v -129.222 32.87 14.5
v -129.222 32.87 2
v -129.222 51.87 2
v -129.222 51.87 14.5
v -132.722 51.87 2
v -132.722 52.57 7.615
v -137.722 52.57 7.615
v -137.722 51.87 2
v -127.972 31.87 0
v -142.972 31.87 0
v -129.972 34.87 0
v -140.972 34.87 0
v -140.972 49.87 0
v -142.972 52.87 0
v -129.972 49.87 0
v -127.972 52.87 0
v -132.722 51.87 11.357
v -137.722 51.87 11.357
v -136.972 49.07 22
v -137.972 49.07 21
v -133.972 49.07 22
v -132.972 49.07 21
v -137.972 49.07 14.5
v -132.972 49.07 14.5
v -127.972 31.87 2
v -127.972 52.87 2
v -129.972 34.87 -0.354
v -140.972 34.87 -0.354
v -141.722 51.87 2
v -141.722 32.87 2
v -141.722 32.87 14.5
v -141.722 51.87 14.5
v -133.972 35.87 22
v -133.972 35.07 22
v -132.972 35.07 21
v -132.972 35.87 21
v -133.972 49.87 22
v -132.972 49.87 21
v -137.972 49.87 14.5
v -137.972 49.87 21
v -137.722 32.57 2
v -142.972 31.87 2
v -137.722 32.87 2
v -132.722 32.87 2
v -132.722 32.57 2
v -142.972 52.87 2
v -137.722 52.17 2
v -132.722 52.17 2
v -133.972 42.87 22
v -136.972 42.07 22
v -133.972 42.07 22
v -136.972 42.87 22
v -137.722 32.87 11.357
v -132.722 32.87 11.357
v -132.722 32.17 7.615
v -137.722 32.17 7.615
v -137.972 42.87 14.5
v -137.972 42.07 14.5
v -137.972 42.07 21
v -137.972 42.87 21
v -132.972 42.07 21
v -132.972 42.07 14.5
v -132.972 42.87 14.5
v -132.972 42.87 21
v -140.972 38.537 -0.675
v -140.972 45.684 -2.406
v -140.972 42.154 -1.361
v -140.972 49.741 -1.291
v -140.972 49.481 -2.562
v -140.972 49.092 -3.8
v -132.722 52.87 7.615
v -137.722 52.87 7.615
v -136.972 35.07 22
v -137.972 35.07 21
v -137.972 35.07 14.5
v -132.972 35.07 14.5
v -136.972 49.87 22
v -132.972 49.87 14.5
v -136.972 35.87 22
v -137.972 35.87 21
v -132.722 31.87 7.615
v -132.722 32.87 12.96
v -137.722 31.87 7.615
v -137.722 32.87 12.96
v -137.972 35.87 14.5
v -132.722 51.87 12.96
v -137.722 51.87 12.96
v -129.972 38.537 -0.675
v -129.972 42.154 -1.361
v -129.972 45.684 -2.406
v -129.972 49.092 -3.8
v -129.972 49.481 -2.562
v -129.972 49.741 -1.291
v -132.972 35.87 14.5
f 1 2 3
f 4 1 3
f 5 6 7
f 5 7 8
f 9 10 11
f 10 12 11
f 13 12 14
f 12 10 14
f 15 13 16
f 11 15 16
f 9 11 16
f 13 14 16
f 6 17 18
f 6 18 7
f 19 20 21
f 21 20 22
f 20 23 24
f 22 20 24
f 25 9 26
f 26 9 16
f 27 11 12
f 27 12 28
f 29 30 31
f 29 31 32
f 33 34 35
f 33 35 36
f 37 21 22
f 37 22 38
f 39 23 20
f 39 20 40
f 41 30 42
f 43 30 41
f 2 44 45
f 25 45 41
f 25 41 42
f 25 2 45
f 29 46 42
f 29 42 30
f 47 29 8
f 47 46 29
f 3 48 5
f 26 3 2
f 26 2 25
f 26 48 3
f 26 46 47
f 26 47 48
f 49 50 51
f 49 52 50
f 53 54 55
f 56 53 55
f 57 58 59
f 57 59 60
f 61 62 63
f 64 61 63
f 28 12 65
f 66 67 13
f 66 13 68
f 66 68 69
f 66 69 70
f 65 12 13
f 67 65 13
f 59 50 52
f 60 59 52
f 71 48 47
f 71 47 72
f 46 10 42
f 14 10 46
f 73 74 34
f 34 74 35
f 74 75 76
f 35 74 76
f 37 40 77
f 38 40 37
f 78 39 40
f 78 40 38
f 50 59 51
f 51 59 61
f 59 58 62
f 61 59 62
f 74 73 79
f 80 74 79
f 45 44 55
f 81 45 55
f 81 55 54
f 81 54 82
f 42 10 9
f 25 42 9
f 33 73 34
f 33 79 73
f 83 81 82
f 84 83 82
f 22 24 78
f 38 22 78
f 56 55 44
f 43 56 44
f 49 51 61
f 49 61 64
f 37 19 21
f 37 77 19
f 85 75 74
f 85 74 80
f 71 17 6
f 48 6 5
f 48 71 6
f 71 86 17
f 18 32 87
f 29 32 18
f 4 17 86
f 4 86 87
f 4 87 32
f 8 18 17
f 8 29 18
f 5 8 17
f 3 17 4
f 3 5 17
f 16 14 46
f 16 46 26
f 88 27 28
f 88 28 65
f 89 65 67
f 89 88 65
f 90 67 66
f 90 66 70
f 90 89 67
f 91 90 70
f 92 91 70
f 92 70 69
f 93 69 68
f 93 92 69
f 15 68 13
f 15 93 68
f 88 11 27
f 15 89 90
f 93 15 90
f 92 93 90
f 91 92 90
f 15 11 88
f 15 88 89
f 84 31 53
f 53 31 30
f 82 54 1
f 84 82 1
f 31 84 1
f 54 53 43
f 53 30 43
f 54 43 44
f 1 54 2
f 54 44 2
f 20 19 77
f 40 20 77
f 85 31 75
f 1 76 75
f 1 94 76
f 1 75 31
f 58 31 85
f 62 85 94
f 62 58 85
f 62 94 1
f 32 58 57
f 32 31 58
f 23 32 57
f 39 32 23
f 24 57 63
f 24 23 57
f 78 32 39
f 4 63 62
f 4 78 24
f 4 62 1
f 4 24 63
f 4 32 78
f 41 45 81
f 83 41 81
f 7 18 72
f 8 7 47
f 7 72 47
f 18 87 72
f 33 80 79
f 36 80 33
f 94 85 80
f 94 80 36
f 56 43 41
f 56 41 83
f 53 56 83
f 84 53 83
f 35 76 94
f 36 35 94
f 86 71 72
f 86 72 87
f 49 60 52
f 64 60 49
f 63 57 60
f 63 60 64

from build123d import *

# Parameters (mm, degrees)
SKETCH_1_W      = 15
SKETCH_1_H      = 21
EXTRUDE_1_DEPTH = 2
SKETCH_2_W      = 12.5
SKETCH_2_H      = 19
EXTRUDE_2_DEPTH = 12.5
SKETCH_3_W      = 5
SKETCH_3_H      = 0.8
EXTRUDE_3_DEPTH = 7.5
CHAMFER_1_SIZE  = 1
EXTRUDE_START   = -2
EXTRUDE_4_DEPTH = 11
EXTRUDE_START_2 = -3.5
EXTRUDE_5_DEPTH = 5


with BuildPart() as part:
    # Эскиз1 → Бобышка-Вытянуть1 (new body)
    with BuildSketch(Plane.XY):
        with Locations((-135.472114918, 42.369501341)):
            Rectangle(SKETCH_1_W, SKETCH_1_H)
    extrude(amount=EXTRUDE_1_DEPTH)

    # Эскиз2 → Бобышка-Вытянуть2 (add)
    with BuildSketch(Plane.XY.offset(2)):
        with Locations((-135.472114918, 42.369501341)):
            Rectangle(SKETCH_2_W, SKETCH_2_H)
    extrude(amount=EXTRUDE_2_DEPTH)

    # Эскиз3 → Бобышка-Вытянуть3 (add)
    with BuildSketch(Plane.XY.offset(14.5)):
        with Locations((-135.472114918, 49.469501341)):
            Rectangle(SKETCH_3_W, SKETCH_3_H)
        with Locations((-135.472114918, 42.469501341)):
            Rectangle(SKETCH_3_W, SKETCH_3_H)
        with Locations((-135.472114918, 35.469501341)):
            Rectangle(SKETCH_3_W, SKETCH_3_H)
    extrude(amount=EXTRUDE_3_DEPTH)

    # Фаска1
    chamfer_1_edges = [part.edges().sort_by_distance(p)[0] for p in [
        (-132.972114918, 49.469501341, 22),
        (-137.972114918, 49.469501341, 22),
        (-132.972114918, 42.469501341, 22),
        (-137.972114918, 42.469501341, 22),
        (-132.972114918, 35.469501341, 22),
        (-137.972114918, 35.469501341, 22),
    ]]
    chamfer(chamfer_1_edges, length=CHAMFER_1_SIZE)

    # Эскиз5 → Бобышка-Вытянуть4 (add)
    with BuildSketch(Plane(origin=(-127.972114918, 0, 0), x_dir=(0, 0, -1), z_dir=(1, 0, 0)).offset(EXTRUDE_START)):
        with BuildLine():
            Line((0, 49.869501341), (0, 34.869501341))
            Line((0, 34.869501341), (0.354216836, 34.869501341))
            ThreePointArc((0.354216836, 34.869501341), (1.36091461, 42.154293323), (3.8, 49.092052117))
            ThreePointArc((3.8, 49.092052117), (1.929874617, 49.626797257), (0, 49.869501341))
        make_face()
    extrude(amount=-EXTRUDE_4_DEPTH)

    # Эскиз6 → Бобышка-Вытянуть5 (add)
    with BuildSketch(Plane(origin=(-129.222114918, 0, 0), x_dir=(0, 0, -1), z_dir=(1, 0, 0)).offset(EXTRUDE_START_2)):
        Polygon((-2, 51.869501341), (-2, 52.169501341), (-7.615330186, 52.869501341), (-12.960465763, 51.869501341), (-11.35692509, 51.869501341), (-7.615330186, 52.569501341), align=None)
        Polygon((-12.960465763, 32.869501341), (-11.35692509, 32.869501341), (-7.615330186, 32.169501341), (-2, 32.869501341), (-2, 32.569501341), (-7.615330186, 31.869501341), align=None)
    extrude(amount=-EXTRUDE_5_DEPTH)


solid = part.part
